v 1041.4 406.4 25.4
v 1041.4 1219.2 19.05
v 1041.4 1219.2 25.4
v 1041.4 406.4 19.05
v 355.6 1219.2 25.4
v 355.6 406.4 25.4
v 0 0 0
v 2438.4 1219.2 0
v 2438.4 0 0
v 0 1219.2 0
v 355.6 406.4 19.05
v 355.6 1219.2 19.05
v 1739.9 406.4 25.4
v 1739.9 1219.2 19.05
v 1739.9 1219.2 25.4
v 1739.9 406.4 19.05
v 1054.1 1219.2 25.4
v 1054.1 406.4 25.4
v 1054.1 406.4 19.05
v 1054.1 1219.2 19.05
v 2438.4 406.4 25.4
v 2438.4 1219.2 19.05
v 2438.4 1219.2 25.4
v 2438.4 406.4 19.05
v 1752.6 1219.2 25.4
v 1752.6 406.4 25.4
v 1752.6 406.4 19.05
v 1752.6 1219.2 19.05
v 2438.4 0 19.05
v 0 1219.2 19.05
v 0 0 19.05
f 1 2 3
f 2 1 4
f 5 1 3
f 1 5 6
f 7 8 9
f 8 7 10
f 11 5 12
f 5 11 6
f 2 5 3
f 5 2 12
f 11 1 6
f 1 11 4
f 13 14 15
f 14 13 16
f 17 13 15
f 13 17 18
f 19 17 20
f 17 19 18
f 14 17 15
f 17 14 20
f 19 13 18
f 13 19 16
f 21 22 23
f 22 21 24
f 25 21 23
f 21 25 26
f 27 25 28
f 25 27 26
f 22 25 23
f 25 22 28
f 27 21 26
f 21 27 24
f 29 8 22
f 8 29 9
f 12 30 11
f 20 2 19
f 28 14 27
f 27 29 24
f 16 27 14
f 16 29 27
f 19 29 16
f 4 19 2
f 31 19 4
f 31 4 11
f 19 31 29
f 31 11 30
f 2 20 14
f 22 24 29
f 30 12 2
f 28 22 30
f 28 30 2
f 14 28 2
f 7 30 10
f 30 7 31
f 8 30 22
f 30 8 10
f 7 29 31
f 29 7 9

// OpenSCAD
$inch = 25.4;


cube([96*$inch, 48*$inch, 3/4*$inch]);

translate([14*$inch,16*$inch,0]) {
    for (i=[0:2])  {
        translate([i*(27.5*$inch), 0,0]) {
            color("Red") cube([27*$inch, 32*$inch, $inch]);
        }
    }
}
